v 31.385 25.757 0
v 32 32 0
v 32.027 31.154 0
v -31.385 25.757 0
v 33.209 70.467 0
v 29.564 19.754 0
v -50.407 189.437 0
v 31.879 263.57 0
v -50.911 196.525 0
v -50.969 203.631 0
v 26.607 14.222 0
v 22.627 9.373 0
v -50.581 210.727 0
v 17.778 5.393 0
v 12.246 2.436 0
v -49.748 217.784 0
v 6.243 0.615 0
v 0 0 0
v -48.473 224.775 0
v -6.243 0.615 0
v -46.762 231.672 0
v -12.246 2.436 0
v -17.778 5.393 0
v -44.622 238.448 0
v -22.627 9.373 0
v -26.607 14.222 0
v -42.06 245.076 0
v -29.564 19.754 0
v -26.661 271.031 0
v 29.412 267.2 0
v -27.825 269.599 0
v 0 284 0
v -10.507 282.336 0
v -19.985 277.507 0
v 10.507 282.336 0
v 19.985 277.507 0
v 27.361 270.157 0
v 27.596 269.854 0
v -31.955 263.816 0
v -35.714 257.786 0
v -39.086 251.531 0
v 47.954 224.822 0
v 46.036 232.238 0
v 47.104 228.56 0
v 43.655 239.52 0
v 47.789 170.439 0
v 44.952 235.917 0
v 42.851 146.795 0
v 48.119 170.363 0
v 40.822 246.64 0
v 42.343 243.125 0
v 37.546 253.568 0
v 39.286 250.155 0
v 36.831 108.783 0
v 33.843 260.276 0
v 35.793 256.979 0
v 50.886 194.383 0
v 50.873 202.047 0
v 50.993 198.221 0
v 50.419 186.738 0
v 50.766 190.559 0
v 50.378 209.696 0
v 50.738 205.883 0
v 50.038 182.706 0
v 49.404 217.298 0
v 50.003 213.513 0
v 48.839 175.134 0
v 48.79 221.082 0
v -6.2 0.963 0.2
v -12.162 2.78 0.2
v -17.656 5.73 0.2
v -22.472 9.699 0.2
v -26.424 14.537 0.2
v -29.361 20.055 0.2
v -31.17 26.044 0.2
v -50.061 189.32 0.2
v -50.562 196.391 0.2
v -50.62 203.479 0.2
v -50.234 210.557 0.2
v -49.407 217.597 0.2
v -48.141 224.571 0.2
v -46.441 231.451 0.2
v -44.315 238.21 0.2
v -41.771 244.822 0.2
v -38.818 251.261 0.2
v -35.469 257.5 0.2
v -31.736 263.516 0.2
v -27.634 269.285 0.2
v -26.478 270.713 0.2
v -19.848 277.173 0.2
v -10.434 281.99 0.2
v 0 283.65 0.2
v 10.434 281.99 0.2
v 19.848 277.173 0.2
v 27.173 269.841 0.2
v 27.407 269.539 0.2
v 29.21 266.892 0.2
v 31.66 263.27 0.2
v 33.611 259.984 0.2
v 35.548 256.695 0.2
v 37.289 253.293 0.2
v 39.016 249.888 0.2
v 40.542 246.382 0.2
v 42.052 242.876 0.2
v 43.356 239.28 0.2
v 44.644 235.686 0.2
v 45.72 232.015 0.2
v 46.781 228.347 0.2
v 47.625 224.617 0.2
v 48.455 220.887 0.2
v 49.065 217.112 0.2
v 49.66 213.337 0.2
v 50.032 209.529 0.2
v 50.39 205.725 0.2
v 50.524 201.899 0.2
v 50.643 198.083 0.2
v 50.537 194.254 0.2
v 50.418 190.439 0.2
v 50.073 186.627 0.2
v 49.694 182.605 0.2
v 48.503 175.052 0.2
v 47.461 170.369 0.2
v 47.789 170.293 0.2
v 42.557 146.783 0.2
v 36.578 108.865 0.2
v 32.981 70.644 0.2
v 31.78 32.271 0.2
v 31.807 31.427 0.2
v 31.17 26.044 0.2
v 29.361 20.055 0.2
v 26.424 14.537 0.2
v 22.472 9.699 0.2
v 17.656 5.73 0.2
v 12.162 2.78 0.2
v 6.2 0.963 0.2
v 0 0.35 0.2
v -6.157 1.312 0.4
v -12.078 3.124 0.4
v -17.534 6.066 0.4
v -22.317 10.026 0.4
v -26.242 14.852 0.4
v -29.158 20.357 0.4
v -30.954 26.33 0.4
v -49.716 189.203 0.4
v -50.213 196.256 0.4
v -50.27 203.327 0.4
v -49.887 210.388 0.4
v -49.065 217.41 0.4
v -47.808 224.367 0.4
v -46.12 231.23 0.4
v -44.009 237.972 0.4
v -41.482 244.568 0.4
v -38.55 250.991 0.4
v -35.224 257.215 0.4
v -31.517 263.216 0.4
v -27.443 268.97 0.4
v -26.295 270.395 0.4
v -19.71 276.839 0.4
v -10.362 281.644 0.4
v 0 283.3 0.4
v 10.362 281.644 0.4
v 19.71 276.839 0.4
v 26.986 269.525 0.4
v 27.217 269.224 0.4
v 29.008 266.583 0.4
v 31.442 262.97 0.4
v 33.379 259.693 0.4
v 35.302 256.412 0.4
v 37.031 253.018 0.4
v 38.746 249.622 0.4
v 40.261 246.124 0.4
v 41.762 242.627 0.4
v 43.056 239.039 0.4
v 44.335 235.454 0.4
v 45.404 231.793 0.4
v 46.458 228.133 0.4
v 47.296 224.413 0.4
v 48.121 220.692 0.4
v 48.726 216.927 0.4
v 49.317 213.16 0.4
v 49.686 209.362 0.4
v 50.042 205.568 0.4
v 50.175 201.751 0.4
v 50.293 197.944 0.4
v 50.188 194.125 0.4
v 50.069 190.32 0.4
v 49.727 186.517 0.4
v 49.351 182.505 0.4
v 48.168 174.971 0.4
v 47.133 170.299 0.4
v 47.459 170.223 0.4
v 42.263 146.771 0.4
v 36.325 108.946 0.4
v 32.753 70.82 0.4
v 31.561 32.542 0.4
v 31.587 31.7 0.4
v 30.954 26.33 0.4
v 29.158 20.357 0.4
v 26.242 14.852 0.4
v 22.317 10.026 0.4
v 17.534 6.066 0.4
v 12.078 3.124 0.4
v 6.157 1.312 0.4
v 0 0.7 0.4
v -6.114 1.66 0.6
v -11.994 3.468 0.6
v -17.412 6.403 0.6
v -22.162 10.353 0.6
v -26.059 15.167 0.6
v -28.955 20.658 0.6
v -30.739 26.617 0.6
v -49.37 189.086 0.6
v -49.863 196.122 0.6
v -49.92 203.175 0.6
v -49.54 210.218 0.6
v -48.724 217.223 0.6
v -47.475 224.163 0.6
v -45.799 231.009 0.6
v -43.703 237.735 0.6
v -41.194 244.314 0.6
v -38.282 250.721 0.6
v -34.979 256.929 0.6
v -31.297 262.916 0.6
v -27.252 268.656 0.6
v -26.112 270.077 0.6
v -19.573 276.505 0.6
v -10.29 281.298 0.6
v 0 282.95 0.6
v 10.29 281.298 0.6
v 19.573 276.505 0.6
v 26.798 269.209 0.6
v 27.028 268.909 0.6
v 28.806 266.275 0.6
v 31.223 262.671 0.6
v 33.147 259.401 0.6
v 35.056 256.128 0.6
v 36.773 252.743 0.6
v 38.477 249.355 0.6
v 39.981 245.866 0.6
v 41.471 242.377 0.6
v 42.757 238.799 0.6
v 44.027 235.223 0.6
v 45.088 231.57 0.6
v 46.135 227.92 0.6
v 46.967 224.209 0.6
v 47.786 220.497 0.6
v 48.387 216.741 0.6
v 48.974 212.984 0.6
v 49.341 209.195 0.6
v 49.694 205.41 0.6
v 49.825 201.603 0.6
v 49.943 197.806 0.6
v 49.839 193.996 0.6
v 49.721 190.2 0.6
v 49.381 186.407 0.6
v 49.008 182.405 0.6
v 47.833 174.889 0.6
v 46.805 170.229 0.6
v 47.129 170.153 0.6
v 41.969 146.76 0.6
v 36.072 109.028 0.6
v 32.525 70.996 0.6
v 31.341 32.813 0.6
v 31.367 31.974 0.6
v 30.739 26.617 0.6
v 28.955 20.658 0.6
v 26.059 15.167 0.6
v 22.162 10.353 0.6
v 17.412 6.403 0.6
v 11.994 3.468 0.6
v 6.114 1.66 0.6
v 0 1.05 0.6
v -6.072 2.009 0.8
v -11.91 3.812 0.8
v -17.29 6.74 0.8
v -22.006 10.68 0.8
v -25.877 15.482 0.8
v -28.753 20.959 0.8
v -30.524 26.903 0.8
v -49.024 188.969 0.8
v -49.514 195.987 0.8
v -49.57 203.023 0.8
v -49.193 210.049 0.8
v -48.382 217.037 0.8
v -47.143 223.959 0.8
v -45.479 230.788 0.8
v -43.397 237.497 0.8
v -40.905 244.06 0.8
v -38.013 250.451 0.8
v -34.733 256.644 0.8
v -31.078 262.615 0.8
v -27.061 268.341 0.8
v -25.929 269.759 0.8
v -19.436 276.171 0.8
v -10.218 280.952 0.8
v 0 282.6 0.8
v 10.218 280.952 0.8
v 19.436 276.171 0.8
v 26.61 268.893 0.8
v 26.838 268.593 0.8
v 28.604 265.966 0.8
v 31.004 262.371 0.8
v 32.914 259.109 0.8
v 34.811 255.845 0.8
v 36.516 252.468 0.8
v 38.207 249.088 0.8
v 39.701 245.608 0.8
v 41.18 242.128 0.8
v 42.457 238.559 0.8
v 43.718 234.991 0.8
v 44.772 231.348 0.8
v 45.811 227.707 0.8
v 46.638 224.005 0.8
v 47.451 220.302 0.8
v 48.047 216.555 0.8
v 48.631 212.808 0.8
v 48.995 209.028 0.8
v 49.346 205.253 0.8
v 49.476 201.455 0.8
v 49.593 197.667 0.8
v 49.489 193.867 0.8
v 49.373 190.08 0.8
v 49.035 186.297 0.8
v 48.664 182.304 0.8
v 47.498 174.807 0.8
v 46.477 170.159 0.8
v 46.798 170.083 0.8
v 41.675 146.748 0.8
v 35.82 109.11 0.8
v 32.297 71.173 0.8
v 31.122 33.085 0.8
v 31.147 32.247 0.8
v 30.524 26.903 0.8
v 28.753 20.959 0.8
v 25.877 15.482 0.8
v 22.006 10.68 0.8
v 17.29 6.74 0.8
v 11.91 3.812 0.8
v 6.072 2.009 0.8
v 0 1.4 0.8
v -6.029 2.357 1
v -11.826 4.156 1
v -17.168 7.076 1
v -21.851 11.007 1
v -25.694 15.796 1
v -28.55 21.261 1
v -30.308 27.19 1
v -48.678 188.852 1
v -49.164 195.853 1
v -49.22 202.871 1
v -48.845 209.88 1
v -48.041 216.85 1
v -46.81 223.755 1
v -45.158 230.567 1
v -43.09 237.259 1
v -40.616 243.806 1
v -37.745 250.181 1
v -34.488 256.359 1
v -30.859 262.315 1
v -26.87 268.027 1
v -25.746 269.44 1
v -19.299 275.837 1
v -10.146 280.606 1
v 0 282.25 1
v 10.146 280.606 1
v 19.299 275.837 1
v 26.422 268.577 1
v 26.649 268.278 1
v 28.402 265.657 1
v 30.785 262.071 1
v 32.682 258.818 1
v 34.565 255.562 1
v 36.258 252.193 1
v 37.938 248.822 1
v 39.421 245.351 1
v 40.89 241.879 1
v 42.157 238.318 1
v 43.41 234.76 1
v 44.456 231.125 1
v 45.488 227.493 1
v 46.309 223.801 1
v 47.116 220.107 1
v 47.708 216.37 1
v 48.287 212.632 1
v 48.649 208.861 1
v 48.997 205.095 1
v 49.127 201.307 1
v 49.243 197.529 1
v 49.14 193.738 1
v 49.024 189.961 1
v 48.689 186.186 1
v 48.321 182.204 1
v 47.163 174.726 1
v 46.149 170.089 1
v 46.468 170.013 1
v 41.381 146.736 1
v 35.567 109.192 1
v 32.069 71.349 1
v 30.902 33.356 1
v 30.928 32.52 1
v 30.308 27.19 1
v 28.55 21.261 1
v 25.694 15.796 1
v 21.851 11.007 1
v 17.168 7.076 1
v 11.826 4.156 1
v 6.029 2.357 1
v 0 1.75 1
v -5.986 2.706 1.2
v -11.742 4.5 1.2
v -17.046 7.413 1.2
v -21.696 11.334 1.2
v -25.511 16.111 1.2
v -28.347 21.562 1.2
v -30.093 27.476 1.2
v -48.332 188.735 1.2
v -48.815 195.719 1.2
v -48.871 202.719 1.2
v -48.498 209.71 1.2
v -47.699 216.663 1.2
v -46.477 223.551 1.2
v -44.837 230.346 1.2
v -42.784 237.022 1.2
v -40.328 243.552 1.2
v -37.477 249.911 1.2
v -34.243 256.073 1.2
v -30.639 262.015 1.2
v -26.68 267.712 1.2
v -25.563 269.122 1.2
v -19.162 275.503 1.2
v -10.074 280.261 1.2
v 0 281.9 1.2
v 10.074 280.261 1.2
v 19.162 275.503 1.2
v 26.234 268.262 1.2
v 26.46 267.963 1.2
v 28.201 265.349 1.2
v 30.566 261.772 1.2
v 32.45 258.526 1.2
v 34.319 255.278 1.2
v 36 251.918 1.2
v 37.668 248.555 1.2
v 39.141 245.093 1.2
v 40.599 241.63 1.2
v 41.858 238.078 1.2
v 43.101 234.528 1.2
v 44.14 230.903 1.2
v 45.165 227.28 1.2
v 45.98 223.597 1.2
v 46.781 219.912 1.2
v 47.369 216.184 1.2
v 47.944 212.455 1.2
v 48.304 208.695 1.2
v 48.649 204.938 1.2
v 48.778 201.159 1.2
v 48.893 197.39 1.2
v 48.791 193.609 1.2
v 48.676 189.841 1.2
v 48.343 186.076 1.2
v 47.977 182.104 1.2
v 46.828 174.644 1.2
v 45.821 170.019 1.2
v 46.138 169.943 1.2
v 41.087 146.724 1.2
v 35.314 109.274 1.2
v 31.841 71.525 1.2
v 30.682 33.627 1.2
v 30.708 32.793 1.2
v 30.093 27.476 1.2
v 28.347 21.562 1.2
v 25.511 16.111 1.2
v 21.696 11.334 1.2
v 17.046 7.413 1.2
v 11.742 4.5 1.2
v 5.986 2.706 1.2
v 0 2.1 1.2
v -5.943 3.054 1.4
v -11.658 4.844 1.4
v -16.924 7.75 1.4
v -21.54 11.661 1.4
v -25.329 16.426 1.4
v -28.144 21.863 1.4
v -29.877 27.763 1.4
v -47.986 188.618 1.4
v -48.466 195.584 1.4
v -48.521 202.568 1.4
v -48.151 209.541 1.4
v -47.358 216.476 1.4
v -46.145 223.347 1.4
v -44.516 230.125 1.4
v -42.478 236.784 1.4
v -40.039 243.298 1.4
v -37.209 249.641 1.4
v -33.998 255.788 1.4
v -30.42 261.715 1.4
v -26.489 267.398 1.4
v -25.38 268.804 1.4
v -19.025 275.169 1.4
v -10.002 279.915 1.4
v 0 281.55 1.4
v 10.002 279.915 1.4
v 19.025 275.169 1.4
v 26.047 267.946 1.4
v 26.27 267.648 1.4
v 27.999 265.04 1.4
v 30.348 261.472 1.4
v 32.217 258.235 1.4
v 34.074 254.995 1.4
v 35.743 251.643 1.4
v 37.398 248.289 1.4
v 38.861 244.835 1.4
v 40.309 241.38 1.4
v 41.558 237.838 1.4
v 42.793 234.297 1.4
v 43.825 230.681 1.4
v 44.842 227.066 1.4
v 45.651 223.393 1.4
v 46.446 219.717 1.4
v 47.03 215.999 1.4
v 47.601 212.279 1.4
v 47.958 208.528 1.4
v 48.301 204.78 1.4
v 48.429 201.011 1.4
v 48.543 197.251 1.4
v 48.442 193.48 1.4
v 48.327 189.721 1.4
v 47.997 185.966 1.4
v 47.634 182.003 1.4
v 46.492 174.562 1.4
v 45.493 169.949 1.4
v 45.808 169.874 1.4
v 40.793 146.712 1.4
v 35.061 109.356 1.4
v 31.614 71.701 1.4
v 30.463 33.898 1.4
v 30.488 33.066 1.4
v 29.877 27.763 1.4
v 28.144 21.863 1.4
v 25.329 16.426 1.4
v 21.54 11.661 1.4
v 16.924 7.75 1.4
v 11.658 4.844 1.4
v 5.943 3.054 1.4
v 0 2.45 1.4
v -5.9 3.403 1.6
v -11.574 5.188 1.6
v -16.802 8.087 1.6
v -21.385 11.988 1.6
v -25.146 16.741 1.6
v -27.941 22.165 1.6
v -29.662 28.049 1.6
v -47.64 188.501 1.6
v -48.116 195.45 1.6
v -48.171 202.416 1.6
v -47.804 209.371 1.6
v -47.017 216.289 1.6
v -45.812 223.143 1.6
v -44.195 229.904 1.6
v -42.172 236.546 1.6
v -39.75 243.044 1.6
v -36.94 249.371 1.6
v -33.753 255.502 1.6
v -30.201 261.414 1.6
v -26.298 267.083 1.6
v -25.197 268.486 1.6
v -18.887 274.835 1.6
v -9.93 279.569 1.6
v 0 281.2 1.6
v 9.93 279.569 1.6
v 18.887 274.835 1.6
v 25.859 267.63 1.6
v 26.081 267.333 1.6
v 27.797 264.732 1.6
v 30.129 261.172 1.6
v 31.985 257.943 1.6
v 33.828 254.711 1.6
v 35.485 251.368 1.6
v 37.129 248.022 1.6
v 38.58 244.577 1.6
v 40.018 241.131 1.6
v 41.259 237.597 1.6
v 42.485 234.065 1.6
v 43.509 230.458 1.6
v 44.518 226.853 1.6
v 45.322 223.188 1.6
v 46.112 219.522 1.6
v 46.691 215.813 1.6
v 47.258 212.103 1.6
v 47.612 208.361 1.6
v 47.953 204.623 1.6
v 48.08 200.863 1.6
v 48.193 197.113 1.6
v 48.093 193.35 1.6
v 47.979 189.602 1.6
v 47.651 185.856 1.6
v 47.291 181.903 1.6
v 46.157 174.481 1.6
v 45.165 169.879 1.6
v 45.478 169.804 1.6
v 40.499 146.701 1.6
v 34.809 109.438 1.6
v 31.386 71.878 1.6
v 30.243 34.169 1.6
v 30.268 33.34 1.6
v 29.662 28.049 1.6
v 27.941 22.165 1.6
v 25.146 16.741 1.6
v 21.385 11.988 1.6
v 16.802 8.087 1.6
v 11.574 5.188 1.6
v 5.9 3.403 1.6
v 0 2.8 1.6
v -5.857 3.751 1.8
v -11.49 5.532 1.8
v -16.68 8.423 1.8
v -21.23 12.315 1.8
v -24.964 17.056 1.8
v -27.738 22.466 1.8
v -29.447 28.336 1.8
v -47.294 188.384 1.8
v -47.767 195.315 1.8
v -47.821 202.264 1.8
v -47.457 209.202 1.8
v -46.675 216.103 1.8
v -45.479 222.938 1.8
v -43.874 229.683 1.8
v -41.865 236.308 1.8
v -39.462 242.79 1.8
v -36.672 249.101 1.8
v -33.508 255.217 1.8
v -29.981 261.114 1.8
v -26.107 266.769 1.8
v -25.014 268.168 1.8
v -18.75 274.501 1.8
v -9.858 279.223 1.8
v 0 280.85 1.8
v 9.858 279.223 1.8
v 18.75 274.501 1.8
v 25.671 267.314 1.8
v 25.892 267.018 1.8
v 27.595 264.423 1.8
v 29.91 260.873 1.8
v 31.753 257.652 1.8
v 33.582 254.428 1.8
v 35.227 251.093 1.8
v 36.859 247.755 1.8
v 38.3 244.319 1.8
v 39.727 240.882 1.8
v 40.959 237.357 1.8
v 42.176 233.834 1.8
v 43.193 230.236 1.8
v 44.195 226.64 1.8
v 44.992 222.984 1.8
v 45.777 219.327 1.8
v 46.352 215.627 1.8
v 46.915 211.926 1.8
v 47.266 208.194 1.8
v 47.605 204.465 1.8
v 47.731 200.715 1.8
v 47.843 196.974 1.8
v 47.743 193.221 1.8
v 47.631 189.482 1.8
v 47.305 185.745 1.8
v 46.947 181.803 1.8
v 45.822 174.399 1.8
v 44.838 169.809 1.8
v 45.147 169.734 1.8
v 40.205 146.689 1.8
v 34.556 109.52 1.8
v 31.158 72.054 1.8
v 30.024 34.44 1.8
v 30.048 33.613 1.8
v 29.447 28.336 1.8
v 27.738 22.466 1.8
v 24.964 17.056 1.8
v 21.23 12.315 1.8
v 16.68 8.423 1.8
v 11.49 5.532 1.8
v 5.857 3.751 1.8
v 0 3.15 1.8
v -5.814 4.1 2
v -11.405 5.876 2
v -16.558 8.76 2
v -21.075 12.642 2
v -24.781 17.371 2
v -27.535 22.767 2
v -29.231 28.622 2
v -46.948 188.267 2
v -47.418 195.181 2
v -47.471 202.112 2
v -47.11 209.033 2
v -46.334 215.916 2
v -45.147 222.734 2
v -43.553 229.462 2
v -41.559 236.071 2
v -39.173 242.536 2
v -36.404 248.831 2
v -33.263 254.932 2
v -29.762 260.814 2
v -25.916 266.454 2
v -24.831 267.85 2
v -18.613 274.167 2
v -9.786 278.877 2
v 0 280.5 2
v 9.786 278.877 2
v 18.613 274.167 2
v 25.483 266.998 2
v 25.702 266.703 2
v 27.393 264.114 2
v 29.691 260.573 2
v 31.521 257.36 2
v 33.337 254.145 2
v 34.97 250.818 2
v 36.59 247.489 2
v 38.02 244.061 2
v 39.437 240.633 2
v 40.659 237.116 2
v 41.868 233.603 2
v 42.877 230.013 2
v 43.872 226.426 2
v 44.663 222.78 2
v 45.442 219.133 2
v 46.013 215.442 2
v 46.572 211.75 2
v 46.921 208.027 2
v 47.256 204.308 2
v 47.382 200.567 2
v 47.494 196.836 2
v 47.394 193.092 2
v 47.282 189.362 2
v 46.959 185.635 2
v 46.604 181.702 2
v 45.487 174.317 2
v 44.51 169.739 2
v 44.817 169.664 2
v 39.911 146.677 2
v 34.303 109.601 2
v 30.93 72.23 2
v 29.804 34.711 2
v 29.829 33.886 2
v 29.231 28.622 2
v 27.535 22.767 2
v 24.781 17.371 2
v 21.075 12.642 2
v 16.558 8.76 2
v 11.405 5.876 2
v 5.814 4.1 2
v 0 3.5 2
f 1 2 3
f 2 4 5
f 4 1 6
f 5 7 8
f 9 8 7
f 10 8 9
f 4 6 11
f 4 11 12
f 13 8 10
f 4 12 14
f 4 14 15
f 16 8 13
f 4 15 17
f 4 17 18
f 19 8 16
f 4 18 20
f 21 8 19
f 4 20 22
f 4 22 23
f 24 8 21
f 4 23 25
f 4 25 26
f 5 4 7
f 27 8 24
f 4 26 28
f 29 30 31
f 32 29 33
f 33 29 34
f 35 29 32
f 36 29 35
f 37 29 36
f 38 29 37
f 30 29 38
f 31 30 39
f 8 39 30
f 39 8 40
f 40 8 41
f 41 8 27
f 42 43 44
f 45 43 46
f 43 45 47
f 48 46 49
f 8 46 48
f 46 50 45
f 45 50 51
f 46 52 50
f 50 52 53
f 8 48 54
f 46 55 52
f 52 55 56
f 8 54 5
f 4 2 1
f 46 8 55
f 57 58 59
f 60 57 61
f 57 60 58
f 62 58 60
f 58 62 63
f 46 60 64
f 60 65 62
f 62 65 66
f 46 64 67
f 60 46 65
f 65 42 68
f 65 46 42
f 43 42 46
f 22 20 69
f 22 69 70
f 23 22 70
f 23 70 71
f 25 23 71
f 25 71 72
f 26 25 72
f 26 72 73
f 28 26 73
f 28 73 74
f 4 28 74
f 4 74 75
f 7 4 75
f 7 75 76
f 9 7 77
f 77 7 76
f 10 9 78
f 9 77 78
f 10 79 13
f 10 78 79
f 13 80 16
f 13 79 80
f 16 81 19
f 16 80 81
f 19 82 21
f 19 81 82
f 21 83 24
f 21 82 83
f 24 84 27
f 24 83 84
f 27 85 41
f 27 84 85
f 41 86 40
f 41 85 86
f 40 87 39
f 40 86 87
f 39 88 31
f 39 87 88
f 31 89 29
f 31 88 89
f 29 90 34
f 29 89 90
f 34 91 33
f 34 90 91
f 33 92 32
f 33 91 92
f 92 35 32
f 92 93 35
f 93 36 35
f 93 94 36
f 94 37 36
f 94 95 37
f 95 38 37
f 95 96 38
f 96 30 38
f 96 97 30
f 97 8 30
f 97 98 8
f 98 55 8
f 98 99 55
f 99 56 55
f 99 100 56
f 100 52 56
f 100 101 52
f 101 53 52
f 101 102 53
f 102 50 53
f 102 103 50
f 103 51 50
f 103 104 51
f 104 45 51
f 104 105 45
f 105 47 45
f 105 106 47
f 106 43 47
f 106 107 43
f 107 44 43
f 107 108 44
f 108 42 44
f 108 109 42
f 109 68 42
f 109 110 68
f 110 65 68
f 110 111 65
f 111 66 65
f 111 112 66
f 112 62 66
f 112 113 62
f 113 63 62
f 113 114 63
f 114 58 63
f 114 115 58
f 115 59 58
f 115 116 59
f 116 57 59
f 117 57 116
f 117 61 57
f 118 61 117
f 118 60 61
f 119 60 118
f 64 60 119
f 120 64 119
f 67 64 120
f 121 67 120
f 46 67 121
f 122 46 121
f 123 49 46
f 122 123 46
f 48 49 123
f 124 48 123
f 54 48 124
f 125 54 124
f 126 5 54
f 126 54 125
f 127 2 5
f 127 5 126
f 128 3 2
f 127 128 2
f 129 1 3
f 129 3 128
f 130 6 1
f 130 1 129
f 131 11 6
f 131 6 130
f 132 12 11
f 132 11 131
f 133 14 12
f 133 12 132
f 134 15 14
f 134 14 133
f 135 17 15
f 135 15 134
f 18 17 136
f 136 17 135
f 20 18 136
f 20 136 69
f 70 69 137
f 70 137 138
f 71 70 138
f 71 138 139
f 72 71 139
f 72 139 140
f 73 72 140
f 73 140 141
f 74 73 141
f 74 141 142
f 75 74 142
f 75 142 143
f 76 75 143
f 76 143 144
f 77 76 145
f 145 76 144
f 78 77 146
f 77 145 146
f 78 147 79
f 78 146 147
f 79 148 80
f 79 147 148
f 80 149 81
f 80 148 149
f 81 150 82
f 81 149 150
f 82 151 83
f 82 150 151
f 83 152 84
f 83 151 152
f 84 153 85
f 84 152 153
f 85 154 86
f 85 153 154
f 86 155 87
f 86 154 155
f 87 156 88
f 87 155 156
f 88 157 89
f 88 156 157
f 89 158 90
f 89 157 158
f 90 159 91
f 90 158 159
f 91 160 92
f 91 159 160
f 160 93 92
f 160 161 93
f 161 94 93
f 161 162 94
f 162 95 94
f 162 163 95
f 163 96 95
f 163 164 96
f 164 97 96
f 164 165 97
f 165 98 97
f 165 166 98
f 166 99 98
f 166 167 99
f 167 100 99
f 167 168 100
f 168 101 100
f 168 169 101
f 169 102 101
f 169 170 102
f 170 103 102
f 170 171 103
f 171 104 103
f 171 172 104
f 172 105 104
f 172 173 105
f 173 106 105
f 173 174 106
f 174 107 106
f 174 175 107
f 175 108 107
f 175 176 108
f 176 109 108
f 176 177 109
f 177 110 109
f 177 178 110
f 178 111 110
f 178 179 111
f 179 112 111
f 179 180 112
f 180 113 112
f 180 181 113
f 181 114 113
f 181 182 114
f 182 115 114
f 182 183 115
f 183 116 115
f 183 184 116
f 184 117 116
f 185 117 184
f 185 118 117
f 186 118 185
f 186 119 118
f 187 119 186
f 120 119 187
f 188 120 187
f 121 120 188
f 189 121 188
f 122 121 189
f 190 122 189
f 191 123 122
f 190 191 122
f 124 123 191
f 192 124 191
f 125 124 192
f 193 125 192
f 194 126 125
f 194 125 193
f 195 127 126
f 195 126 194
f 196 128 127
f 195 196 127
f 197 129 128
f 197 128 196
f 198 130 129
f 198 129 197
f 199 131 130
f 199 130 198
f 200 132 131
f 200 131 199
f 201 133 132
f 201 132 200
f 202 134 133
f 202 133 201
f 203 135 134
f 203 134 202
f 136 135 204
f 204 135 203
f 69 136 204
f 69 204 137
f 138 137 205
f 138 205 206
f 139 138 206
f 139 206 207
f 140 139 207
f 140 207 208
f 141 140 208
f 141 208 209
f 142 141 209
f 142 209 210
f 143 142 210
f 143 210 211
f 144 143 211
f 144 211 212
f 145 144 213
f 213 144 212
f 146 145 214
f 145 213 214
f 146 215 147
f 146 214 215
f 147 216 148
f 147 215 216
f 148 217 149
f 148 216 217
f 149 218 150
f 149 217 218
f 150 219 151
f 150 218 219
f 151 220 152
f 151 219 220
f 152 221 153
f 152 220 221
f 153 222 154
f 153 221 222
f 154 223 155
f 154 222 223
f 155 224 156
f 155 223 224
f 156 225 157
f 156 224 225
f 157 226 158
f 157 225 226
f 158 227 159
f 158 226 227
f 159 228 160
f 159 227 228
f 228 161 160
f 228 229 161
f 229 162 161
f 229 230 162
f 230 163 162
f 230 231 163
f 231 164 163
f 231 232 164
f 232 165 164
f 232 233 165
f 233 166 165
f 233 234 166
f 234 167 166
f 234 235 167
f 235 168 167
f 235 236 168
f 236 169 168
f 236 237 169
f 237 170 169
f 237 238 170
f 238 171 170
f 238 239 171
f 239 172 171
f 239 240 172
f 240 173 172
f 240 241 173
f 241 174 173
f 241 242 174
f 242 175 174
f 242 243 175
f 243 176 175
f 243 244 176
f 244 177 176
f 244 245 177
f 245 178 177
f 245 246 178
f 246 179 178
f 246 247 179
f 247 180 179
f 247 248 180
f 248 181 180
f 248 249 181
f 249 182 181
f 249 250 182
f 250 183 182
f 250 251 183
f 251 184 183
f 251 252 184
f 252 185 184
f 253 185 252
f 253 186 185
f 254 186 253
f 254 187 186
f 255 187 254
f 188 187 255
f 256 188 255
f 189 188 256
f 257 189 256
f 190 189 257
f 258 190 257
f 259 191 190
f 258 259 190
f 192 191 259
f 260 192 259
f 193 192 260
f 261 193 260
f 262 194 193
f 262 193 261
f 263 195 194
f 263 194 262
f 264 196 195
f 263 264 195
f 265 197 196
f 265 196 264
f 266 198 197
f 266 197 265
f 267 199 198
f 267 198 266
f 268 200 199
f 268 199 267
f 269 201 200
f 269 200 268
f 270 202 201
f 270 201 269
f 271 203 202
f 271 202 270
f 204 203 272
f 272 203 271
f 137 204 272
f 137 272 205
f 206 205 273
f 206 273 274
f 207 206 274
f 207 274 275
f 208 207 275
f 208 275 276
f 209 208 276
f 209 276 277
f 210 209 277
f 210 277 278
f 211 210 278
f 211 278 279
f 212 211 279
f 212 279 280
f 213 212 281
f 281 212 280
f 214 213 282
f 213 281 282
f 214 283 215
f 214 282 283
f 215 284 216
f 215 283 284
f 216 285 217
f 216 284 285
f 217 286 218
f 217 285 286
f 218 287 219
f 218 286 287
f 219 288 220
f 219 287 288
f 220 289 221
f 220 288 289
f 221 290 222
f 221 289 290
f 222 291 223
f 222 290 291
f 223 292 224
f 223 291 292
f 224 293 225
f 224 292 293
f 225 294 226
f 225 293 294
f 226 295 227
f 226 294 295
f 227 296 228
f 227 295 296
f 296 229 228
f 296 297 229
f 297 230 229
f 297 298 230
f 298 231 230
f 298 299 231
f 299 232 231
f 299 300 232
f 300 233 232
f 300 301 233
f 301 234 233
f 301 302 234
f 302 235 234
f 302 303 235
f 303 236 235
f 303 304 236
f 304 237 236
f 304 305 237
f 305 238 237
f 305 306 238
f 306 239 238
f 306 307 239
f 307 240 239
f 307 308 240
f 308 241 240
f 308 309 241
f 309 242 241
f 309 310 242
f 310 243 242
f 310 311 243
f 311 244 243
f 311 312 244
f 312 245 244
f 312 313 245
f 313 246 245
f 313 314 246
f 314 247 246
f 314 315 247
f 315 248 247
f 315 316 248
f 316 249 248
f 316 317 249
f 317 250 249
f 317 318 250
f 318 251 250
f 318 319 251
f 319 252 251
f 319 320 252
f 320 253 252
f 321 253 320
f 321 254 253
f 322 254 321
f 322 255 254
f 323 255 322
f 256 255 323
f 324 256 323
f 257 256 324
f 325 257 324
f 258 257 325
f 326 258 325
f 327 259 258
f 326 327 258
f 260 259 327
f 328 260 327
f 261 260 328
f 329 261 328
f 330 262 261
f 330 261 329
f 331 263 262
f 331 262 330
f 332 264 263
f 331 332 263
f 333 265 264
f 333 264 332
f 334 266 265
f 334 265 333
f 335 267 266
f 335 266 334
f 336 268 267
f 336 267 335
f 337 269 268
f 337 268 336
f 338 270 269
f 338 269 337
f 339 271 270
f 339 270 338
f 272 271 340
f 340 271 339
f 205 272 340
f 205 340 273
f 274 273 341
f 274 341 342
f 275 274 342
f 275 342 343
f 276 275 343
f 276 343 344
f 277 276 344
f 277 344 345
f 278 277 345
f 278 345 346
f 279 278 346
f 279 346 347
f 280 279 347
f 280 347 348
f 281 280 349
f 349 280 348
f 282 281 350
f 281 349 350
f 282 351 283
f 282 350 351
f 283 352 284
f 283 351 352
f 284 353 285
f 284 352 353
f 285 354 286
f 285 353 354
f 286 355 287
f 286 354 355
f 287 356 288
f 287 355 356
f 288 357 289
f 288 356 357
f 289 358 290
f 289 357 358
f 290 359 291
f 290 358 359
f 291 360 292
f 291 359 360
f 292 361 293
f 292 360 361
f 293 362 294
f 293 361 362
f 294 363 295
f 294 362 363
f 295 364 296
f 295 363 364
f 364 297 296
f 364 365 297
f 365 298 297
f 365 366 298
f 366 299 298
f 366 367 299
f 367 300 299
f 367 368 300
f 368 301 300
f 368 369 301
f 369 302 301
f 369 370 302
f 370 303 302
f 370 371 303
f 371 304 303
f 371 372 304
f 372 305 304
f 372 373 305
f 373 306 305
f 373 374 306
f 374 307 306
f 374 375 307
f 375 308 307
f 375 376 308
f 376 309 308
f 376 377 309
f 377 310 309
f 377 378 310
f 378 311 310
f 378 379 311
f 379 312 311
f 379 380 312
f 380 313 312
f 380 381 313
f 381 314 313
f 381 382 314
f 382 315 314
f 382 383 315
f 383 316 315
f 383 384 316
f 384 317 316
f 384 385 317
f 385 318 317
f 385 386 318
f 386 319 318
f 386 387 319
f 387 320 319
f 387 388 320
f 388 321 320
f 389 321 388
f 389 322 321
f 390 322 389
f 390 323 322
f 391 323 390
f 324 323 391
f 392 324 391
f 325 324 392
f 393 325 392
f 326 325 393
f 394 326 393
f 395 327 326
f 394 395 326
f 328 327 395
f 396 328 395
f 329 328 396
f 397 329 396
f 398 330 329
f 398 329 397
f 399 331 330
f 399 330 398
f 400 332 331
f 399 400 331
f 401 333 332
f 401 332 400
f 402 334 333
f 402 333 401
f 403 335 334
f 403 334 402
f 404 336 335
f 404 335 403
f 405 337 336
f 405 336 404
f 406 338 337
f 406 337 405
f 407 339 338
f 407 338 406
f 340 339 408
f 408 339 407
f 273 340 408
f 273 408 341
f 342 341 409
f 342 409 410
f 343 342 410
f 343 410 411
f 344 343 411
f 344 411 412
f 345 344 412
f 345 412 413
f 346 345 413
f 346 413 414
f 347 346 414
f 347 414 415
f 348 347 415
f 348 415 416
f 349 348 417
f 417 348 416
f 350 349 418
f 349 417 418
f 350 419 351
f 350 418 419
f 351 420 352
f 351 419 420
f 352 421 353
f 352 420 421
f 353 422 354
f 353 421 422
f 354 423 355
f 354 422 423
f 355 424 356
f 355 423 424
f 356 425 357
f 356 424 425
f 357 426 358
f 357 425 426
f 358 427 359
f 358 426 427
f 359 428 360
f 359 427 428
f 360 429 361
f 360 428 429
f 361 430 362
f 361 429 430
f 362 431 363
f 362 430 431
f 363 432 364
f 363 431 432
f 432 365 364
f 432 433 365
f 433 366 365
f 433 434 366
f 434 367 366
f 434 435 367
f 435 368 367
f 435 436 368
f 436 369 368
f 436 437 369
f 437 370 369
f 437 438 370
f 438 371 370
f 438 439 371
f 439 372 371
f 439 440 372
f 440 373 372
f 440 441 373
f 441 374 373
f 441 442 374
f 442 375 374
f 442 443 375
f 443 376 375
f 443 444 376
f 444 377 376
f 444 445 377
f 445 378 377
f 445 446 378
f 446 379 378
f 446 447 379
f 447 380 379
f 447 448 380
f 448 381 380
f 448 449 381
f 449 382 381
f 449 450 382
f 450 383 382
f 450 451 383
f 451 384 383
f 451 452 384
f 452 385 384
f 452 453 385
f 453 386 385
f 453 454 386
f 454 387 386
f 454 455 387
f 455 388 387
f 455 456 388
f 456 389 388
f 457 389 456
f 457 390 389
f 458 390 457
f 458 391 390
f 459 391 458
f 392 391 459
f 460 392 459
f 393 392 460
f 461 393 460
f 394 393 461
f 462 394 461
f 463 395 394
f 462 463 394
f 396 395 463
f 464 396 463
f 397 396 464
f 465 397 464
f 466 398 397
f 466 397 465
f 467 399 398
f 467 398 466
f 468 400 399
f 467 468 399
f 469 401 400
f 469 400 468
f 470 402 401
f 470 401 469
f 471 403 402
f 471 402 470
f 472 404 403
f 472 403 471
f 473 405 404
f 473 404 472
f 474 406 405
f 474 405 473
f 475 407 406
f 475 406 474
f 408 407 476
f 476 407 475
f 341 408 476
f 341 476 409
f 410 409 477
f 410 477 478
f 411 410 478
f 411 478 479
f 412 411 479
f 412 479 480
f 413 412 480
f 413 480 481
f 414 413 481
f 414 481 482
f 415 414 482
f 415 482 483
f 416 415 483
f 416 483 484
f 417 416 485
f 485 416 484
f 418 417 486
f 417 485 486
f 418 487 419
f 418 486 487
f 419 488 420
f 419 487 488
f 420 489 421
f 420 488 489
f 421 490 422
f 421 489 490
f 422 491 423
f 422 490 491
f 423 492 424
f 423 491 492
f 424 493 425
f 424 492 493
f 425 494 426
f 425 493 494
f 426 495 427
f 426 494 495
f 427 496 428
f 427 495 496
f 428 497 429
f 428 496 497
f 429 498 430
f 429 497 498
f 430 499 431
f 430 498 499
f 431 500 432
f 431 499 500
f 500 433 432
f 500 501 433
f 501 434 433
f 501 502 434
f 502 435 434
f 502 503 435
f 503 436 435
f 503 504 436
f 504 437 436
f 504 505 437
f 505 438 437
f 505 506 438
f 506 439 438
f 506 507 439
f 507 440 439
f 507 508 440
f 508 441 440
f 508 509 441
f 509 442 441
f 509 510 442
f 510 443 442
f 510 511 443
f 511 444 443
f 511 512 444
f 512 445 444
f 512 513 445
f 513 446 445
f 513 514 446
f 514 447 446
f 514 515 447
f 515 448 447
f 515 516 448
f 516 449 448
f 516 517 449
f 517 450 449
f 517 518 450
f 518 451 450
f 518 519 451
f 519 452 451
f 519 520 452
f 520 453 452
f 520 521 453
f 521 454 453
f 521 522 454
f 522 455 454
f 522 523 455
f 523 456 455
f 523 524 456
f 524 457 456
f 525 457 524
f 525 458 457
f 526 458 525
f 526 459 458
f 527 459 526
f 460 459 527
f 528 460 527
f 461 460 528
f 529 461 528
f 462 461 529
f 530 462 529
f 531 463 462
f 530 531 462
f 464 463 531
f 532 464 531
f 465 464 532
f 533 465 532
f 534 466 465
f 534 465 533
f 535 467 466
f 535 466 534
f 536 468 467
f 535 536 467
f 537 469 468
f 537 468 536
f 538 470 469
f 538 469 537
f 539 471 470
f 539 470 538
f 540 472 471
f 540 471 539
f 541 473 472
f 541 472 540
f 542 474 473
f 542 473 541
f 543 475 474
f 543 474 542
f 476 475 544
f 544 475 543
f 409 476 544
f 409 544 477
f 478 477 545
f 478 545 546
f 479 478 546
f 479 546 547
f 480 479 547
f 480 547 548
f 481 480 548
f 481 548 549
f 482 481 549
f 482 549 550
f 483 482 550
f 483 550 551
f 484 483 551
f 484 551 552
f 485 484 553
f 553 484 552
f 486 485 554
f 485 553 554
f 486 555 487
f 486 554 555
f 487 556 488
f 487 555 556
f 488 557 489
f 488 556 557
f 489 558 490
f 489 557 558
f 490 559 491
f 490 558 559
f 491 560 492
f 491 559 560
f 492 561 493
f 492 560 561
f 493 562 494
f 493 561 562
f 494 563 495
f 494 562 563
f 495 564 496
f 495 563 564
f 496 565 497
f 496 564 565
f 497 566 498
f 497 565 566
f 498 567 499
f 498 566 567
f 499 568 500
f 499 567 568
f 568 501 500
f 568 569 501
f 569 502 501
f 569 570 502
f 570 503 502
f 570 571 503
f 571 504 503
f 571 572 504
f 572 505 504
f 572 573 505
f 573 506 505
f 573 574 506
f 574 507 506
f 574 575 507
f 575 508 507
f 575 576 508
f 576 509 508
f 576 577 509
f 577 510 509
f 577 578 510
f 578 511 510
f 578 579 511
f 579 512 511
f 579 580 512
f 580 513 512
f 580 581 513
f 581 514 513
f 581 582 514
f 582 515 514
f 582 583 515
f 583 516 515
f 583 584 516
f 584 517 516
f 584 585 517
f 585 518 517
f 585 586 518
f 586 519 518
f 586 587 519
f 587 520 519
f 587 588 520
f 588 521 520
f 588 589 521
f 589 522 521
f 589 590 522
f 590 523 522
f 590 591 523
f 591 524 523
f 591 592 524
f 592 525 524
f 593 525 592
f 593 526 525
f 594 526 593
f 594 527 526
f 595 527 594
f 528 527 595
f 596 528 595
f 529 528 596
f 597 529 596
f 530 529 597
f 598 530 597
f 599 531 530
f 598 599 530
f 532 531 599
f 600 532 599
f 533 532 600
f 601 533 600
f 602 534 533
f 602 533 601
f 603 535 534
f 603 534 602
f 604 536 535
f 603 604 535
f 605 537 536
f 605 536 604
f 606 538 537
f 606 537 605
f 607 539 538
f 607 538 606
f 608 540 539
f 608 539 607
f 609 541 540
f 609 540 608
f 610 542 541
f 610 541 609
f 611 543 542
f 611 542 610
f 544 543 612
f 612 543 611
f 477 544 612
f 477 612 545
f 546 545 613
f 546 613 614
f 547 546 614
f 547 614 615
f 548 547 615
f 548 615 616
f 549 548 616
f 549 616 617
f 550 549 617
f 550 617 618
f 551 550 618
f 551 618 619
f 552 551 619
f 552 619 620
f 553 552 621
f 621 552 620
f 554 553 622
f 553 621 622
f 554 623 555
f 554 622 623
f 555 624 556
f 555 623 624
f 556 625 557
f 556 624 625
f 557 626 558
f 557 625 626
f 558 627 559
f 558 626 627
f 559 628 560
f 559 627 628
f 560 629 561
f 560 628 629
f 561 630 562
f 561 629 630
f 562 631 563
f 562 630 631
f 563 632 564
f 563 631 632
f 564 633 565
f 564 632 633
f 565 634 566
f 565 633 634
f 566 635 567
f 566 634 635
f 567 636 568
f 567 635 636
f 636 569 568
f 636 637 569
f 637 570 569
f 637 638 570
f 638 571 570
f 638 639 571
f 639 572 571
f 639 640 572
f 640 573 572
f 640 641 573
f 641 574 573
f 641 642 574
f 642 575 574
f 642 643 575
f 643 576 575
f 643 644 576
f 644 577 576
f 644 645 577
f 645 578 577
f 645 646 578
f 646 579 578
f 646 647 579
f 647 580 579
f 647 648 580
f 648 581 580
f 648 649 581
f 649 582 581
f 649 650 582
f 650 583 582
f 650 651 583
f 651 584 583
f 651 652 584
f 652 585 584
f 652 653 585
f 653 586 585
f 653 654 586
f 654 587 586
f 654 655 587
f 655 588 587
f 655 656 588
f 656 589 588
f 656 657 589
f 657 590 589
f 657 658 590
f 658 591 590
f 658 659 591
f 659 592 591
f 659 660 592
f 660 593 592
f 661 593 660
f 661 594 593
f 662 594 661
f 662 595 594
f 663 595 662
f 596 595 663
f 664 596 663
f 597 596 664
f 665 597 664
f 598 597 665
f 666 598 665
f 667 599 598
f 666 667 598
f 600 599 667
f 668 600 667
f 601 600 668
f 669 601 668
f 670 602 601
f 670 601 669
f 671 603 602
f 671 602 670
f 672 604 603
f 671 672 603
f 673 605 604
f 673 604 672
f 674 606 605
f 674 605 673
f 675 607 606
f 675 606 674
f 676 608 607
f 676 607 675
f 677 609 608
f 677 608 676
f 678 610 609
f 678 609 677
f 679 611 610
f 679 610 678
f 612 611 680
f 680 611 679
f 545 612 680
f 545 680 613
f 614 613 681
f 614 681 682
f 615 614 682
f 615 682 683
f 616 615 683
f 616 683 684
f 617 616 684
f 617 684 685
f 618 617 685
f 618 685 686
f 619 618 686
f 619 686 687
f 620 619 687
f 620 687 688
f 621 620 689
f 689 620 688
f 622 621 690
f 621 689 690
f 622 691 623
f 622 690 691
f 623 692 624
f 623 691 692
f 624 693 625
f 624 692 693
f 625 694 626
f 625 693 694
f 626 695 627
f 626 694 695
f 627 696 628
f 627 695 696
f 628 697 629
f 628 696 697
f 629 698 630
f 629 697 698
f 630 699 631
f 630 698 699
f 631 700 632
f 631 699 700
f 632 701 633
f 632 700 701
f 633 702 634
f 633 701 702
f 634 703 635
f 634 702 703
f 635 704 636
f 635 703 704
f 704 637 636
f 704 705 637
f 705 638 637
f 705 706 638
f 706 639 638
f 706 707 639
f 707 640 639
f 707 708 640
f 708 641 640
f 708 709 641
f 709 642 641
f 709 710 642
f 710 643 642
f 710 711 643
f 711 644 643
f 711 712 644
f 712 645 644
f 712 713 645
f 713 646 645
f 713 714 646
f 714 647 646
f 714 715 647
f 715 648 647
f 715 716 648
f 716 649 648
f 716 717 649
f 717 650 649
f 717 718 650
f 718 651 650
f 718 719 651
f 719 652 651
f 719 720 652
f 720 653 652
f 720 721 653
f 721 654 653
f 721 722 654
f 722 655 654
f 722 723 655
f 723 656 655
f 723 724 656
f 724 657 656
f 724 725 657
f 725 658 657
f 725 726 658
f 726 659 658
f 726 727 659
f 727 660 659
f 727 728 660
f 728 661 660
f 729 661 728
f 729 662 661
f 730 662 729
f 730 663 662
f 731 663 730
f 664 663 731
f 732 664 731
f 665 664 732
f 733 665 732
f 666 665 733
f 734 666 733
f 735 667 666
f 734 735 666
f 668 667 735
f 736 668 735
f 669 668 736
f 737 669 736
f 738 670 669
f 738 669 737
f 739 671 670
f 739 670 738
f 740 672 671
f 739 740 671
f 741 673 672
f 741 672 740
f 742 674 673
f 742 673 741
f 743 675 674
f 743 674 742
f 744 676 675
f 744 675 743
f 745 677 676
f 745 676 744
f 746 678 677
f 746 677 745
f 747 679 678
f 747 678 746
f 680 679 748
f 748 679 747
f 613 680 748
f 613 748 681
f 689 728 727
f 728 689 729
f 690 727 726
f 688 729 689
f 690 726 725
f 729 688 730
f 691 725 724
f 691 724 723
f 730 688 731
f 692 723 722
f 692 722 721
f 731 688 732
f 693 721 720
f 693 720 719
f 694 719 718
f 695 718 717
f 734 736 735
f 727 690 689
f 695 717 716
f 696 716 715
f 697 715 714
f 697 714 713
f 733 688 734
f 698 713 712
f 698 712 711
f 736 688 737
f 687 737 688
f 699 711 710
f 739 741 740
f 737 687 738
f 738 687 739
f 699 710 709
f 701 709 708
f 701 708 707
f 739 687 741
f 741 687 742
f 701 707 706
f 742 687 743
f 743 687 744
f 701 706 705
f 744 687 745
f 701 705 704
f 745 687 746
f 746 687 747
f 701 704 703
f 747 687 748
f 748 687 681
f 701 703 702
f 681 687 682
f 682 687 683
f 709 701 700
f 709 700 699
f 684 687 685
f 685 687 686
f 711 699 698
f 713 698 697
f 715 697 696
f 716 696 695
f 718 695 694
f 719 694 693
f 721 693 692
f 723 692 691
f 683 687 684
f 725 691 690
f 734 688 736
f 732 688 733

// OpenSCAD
// Flexy-Form Insole v1.0 by Gyrobot
// http://www.gyrobot.co.uk
//
// Thanks to Swindon Hackspace member "Axford" http://axrap.blogspot.co.uk/
//
// preview[view:east, tilt:top]
// User Parameters

Length = 284;//260;              // See Drawing
Heel_Radius = 32; //42; //26;//35;          // See Drawing
Toe_Radius = 34; //32;//35;           // See Drawing
Outside_Width = 51; //46;//55;         // See Drawing
Inside_Width = 51; //38;//40;          // See Drawing
Inside_Length = 201;//165;//190;        // See Drawing
Outside_Length = 198; //145;//165;       // See Drawing
Instep_Offset = 42; //21;//25;         // See Drawing
Foot = "Left" ;            // [Left, Right] 
STL_Type = "Lower" ;       // [Joined, Upper, Lower]
Lattice = "On" ;            // [On, Off]
Number_of_Hinge_Lines = 3;  // Number of breaks in the rigid layers
Thickness = 4;//5;              // Overall thickness of the insole
Rigid_Layer_Thickness = 2;//2.5;// thickness of rigid thermoformable layer
Chamfer_Width = 7;          // determines the slope round the edges

// Start of Code

module sector2D(r, a, center = true) {
    intersection() {
            circle(r = r, center = true);
                polygon(points = [
                    [0, 0],
                    [2 * r * cos(0),  2 * r * sin(0)],
                    [2 * r * cos(a * 0.2),  2 * r * sin(a * 0.2)],
                    [2 * r * cos(a * 0.4),  2 * r * sin(a * 0.4)],
                    [2 * r * cos(a * 0.6),  2 * r * sin(a * 0.6)],
                    [2 * r * cos(a * 0.8),  2 * r * sin(a * 0.8)],
                    [2 * r * cos(a), 2 * r * sin(a)],
                ]);
        }
}


// pass u and v as vectors
function dotProduct(u,v) = u[0]*v[0] + u[1]*v[1];
function mag(u) = sqrt(pow(u[0],2) + pow(u[1],2));

// calculate the radius of a circle that is tangential to a circle at the origin or radius r, with a center offset by x,y
function tangentialCircleRadius(r,x,y) = ( pow(y,2) + pow(r,2) +pow(x,2) - 2*r*x ) / ( 2*x - 2*r) + r;

// calculate the intersection of two circles, returns a vector - support functions for intermediate calcs
function ccid(x1,y1,x2,y2) = mag([x1-x2, y1-y2]);
function ccil(r1,r2,d) = (pow(r1,2) - pow(r2,2) + pow(d,2)) / (2*d);
//function ccih(r1, l) = sqrt(pow(r1,2) - pow(l,2));
function ccih(r1, l) = 0;

function circleCircleIntersection(x1,y1,r1, x2,y2,r2) = [
    (ccil(r1,r2,ccid(x1,y1,x2,y2)) / ccid(x1,y1,x2,y2)) * (x2-x1) + (ccih(r1, ccil(r1,r2,ccid(x1,y1,x2,y2))) / ccid(x1,y1,x2,y2))*(y2-y1) + x1,
    (ccil(r1,r2,ccid(x1,y1,x2,y2)) / ccid(x1,y1,x2,y2)) * (y2-y1) + (ccih(r1, ccil(r1,r2,ccid(x1,y1,x2,y2))) / ccid(x1,y1,x2,y2))*(x2-x1) + y1
];


module pocket(w,r) {
    // pill shape, centred on the origin
    hull() {
        translate([w/2,0,0])
            circle(r);
        translate([-w/2,0,0])
            circle(r);
    }
}

// i,j are number of repetitions
// x,y are spacing
// pass child profile to be laid out
// always starts from origin and expands along x+, y+
module grid(i,j,x,y, stagger=false) {
    for (a=[0:i-1], b=[0:j-1])
        translate([a*(stagger ? x/2 : x), b*y + ((stagger && (a % 2 == 0)) ? y/2 : 0), 0])
        children();
}

module Profile (l, hr, tr, iw, il, ow, ol, io) {

    // calculate radii for inside/outside arcs that contact the toe
    ir = tangentialCircleRadius(tr, iw, l-il-tr);
    or = tangentialCircleRadius(tr, ow, l-ol-tr);

    // calculate the intersection points for associated arcs
    // first for the inside arc, first circle is the toe, second circle is the inside arc
    ii = circleCircleIntersection(0, l-tr, tr, -ir+iw, il, ir);
    xi = ii[0];
    yi = ii[1];

    // debug the intersection point
    *translate([xi,yi,1])
        circle(1);

    u1 = [xi- (-ir+iw), yi- il];
    v1 = [ u1[0], -u1[1]];
    ia2 = acos(dotProduct(u1,v1) / (mag(u1) * mag(v1)));   // angle of segment
    ia1 = atan2(yi - il, xi - (-ir+iw)) - ia2;  // angle from x-axis, CCW when viewed down Z


    // do the same for the outside arc
    ci = circleCircleIntersection(0, l-tr, tr, or-ow, ol, or);
    xo = ci[0];
    yo = ci[1];

    // debug the intersection point
    *translate([xo,yo,1])
        circle(1);

    u2 = [xo- (or-iw), yo- ol];
    v2 = [ u2[0], -u2[1]];
    oa2 = acos(dotProduct(u2,v2) / (mag(u2) * mag(v2)));   // angle of segment
    oa1 = atan2(yo - ol, xo - (or-ow));  // angle from x-axis, CCW when viewed down Z

    difference () {

        union() {

            // toe and ball of foot
            hull (){
                //Toe
                translate ([0,l-tr,0])
                     circle (tr);

                // inside
                difference() {
                    translate ([-ir+iw,il,0])
                        rotate([0,0,ia1])
                        sector2D(ir, ia2, $fn=100);

                    translate([-ir,il-ir,0])
                         square([ir, 2*ir]);
                }
                // outside
                difference() {
                    translate ([or-ow,ol,0])
                        rotate([0,0,oa1])
                        sector2D(or, oa2, $fn=100);

                    translate([0,ol-or,0])
                        square([or, 2*or]);
                }
                //Heel
                translate ([0,hr,0])
                    circle (hr, $fn=32);
            }
        }
        // cut away inside arc
        //
        // two tangency arcs solutions exist for each set of inputs, need to reject +h value and keep -h solution (hopefully)
        //
        // r3     = radius of bi-tangent arc
        // alt_r3 = alternate solution for r3
        // h      = height offset in y from bi-tangency arc centre point to centre of Heel_Radius
        // alt_h  = alternate solution for h
        //
        delx = ir-iw;
        dely = -il+hr;
        
        h = (dely*(hr - io) + sqrt(-(hr - io)*(delx + io - ir)*(pow(delx,2) + pow(dely,2) - pow(hr,2) + 2*hr*ir - pow(ir,2))))/(delx + hr - ir);
        
        r3 = (dely*(dely*(hr - io) + sqrt(-(hr - io)*(delx + io - ir)*(pow(delx,2) + pow(dely,2) - pow(hr,2) + 2*hr*ir - pow(ir,2)))) - (delx + hr - ir)*(pow(delx,2) + 2*delx*io + pow(dely,2) + pow(hr,2) - pow(ir,2))/2)/pow((delx + hr - ir),2);
        
        alt_h = (dely*(hr - io)*(delx + hr - ir) + sqrt(-(hr - io)*(delx + io - ir)*(pow(delx,2) + pow(dely,2) - pow(hr,2) + 2*hr*ir - pow(ir,2)))*(-delx - hr + ir))/pow((delx + hr - ir),2);
        
        alt_r3 = (dely*(dely*(hr - io)*(delx + hr - ir) + sqrt(-(hr - io)*(delx + io - ir)*(pow(delx,2) + pow(dely,2) - pow(hr,2) + 2*hr*ir - pow(ir,2)))*(-delx - hr + ir)) + pow((delx + hr - ir),2)*(pow(-delx,2) - 2*delx*io - pow(dely,2) - pow(hr,2) + pow(ir,2))/2)/pow((delx + hr - ir),3);
        
        //
        // solution [1]
        //
        translate ([r3+io,-h+hr,0])
        circle(r3,$fn=100);
        //
        // solution [2]
        //
*       translate ([alt_r3+io,-alt_h+hr,0])
*       circle(alt_r3,$fn=100);
        //
        // cut away outside arc
        //
        // calculate outstep radii (otr) for outstep arc that contacts the heel
        otr = (pow(or,2) - pow(hr - ol,2) - pow(hr + or - ow,2))/(2*(hr - ow));
        translate ([-otr-hr,hr,0])
        circle(otr,$fn=100);

        union() {
            // inside upper tangency tidy up
            difference(){
                polygon(points=[[iw-ir,il],[r3+io,-h+hr],[r3+io,l],[iw-ir,l]]);
                translate ([-ir+iw,il,0])
                circle(ir,$fn=100);
                translate ([r3+io,-h+hr,0])
                circle(r3,$fn=100);
            }
        }
        union() {
            // inside lower tangency tidy up
            difference(){
                polygon(points=[[0,0],[0,hr],[r3+io,-h+hr],[r3+io,0]]);
                translate ([0,hr,0])
                circle(hr,$fn=100);
                translate ([r3+io,-h+hr,0])
                circle(r3,$fn=100);
            }
        }
        union() {
            // outside upper tangency tidy up
            difference(){
                polygon(points=[[or-ow,ol],[-otr-hr,hr],[-otr-hr,l],[or-ow,l]]);
                translate ([or-ow,ol,0])
                circle(or,$fn=100);
                translate ([-otr-hr,hr,0])
                circle(otr,$fn=100);
            }
        }
    }
};

module bevel_extrude(height=20, length=5, width=100, cw=5)
{
    xscale = (width-(2*cw))/width;
    yscale = (length-(2*cw))/length;
    translate ([0,length/2,0])
		linear_extrude(height=height, convexity=5, scale=[xscale,yscale])
        translate ([0,-length/2,0])
		children();
}

// to be differenced away from the insole to produce a joint line
module joint(w=4, t=5, rlt=2.5, num_hl=3) {
    minhinge_dist = -5*(num_hl-1);
    maxhinge_dist = 5*(num_hl-1);
    translate([0,0,t-rlt])
        for (yoff=[minhinge_dist:10:maxhinge_dist]){
            linear_extrude(t+rlt)
            hull() {
                translate([Inside_Width, Inside_Length+yoff, 0])
                    circle(w/2);
    
                translate([-Outside_Width, Outside_Length+yoff, 0])
                    circle(w/2);
            }
        }
}

// to be differenced away from the insole
module gridPattern(gs, t, rlt, num_hl) {

    intersection() {
        // grid
        translate([-Outside_Width, -20, t-rlt])
            grid(2*round((Outside_Width + Inside_Width)/gs), round(Length/gs)+2, gs, gs, true)
            linear_extrude(t+rlt) {
                pocket(6,0.5);

                translate([0, gs/2, 0])
                    rotate([0,0,90])
                    pocket(6,0.5);
            }

        // inset sole, less joint
        difference() {
                bevel_extrude(height=t+0.3, length=Length, width=Inside_Width+Outside_Width, cw=Chamfer_Width, $fn=20)
                offset(delta = -3, join_type = "round")
                Profile (Length, Heel_Radius, Toe_Radius, Inside_Width, Inside_Length, Outside_Width, Outside_Length, Instep_Offset);
                joint(w=2 + 4, t=t, rlt=rlt, num_hl=num_hl);
        }


    }

}

module Shoe() {
    t = Thickness;
    rlt = Rigid_Layer_Thickness;
    num_hl = Number_of_Hinge_Lines;
    inset = Chamfer_Width;
    gs = 14;  // grid spacing

    if (STL_Type=="Joined")
        difference() {
            bevel_extrude(height=t, length=Length, width=Inside_Width+Outside_Width, cw=Chamfer_Width, $fn=20)
                Profile (Length, Heel_Radius, Toe_Radius, Inside_Width, Inside_Length, Outside_Width, Outside_Length, Instep_Offset);
    
            // joint line
            joint(2, t, rlt, num_hl);
    
            // grid
            if (Lattice == "On") gridPattern(gs, t, rlt, num_hl);
        }
    if (STL_Type=="Upper")
        difference() {
            bevel_extrude(height=t, length=Length,width=Inside_Width+Outside_Width, cw=Chamfer_Width, $fn=20)
                Profile (Length, Heel_Radius, Toe_Radius, Inside_Width, Inside_Length, Outside_Width, Outside_Length, Instep_Offset);
    
            // joint line
            joint(2, t, rlt+0.2, num_hl);
    
            // grid
            if (Lattice == "On")
                translate ([0,0,-0.2])
                gridPattern(gs, t, rlt, num_hl);
            
            // Remove Lower
            translate ([-Outside_Width-5,-5,-5])
            cube([Outside_Width+Inside_Width+10,Length+10,Rigid_Layer_Thickness+5]);
        }
    if (STL_Type=="Lower")
        difference() {
            bevel_extrude(height=t, length=Length,width=Inside_Width+Outside_Width, cw=Chamfer_Width, $fn=20)
                Profile (Length, Heel_Radius, Toe_Radius, Inside_Width, Inside_Length, Outside_Width, Outside_Length, Instep_Offset);
            
            // Remove Upper
            translate ([-Outside_Width-5,-5,Rigid_Layer_Thickness])
            cube([Outside_Width+Inside_Width+10,Length+10,Thickness]);
    }
}

//if (Foot == "Right") Shoe();
if (Foot == "Left") mirror([1,0,0]) {
    //projection(cut=false)
    difference(){
    Shoe();
    //#translate([-60,35,-4])#cube([150,250,50]);
    }
}
